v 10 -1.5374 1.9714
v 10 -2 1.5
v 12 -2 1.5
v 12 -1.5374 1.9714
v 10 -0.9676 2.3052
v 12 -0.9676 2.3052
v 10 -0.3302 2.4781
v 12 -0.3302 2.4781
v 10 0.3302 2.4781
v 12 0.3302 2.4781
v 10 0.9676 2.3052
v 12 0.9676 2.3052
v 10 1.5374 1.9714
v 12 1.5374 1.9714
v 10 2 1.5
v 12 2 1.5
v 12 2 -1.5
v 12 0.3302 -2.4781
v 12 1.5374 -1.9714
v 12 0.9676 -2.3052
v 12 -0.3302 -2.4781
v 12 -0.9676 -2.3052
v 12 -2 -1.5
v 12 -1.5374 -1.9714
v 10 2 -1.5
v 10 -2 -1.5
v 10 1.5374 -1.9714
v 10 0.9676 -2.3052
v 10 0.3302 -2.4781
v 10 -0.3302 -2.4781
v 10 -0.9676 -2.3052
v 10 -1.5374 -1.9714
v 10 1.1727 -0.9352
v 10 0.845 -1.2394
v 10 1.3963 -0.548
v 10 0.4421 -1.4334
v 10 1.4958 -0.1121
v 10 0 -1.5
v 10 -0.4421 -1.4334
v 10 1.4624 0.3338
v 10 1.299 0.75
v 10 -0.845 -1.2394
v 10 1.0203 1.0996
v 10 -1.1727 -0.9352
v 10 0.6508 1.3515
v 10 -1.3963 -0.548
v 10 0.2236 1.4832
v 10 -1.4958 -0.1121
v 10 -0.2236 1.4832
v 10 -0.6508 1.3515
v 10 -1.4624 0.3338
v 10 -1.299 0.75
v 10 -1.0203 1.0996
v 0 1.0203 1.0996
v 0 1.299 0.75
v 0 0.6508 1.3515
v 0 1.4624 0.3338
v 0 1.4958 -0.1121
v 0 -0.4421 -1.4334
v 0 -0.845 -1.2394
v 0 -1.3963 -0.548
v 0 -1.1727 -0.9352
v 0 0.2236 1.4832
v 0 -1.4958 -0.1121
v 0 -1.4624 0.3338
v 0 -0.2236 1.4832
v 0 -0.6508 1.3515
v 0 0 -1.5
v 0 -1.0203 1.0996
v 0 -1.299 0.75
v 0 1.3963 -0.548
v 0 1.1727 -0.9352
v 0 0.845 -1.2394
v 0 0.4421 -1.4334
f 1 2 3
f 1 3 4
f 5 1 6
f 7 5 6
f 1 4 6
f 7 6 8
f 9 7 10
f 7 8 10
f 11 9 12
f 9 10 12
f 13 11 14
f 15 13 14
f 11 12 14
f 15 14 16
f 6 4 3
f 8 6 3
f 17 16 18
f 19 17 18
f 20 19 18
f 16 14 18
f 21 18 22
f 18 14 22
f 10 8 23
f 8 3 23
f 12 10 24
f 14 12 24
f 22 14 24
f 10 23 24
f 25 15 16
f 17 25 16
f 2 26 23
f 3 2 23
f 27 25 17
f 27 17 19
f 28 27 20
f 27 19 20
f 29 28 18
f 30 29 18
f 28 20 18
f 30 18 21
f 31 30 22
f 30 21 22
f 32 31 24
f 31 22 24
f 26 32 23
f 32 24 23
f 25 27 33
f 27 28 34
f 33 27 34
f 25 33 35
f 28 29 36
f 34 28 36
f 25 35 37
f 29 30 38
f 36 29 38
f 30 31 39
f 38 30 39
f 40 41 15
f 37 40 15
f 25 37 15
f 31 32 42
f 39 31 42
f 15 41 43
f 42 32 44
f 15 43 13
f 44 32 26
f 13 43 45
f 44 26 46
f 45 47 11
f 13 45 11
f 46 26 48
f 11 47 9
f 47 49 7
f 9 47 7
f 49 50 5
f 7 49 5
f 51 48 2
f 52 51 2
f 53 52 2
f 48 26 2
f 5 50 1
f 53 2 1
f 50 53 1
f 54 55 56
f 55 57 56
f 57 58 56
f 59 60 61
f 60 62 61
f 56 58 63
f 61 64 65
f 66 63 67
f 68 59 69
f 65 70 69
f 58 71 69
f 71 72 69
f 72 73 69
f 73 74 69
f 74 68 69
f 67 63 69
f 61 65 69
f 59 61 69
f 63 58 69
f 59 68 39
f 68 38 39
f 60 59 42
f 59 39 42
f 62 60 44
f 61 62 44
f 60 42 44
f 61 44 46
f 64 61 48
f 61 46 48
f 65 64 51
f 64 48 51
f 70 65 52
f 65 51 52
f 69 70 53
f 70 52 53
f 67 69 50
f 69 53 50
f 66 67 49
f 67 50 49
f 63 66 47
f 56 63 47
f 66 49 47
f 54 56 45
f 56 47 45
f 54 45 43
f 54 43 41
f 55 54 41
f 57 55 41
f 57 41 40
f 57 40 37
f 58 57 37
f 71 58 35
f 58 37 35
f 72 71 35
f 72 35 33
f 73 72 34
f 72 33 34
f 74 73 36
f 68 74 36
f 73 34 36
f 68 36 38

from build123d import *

# Parameters (mm, degrees)
SKETCH2_W          = 2
SKETCH2_H          = 5
CUT_EXTRUDE1_DEPTH = 1
SKETCH4_W          = 2
SKETCH4_H          = 3
CUT_EXTRUDE2_DEPTH = 1


with BuildPart() as part:
    # Sketch1 → Revolve1 (revolve)
    with BuildSketch(Plane.XY, mode=Mode.PRIVATE) as revolve1_sk:
        Polygon((0, 0), (0, -1.5), (10, -1.5), (10, -2.5), (12, -2.5), (12, 0), align=None)
    revolve(revolve1_sk.sketch.rotate(Axis((12, 0, 0), (-1, 0, 0)), 270), axis=Axis((12, 0, 0), (-1, 0, 0)))

    # Sketch2 → Cut-Extrude1 (cut)
    with BuildSketch(Plane(origin=(0, 3, 0), x_dir=(1, 0, 0), z_dir=(0, 1, 0))):
        with Locations((11, 0)):
            Rectangle(SKETCH2_W, SKETCH2_H)
    extrude(amount=-CUT_EXTRUDE1_DEPTH, mode=Mode.SUBTRACT)

    # Sketch4 → Cut-Extrude2 (cut)
    with BuildSketch(Plane(origin=(0, -3, 0), x_dir=(1, 0, 0), z_dir=(0, 1, 0))):
        with Locations((11, 0)):
            Rectangle(SKETCH4_W, SKETCH4_H)
    extrude(amount=CUT_EXTRUDE2_DEPTH, mode=Mode.SUBTRACT)


solid = part.part
